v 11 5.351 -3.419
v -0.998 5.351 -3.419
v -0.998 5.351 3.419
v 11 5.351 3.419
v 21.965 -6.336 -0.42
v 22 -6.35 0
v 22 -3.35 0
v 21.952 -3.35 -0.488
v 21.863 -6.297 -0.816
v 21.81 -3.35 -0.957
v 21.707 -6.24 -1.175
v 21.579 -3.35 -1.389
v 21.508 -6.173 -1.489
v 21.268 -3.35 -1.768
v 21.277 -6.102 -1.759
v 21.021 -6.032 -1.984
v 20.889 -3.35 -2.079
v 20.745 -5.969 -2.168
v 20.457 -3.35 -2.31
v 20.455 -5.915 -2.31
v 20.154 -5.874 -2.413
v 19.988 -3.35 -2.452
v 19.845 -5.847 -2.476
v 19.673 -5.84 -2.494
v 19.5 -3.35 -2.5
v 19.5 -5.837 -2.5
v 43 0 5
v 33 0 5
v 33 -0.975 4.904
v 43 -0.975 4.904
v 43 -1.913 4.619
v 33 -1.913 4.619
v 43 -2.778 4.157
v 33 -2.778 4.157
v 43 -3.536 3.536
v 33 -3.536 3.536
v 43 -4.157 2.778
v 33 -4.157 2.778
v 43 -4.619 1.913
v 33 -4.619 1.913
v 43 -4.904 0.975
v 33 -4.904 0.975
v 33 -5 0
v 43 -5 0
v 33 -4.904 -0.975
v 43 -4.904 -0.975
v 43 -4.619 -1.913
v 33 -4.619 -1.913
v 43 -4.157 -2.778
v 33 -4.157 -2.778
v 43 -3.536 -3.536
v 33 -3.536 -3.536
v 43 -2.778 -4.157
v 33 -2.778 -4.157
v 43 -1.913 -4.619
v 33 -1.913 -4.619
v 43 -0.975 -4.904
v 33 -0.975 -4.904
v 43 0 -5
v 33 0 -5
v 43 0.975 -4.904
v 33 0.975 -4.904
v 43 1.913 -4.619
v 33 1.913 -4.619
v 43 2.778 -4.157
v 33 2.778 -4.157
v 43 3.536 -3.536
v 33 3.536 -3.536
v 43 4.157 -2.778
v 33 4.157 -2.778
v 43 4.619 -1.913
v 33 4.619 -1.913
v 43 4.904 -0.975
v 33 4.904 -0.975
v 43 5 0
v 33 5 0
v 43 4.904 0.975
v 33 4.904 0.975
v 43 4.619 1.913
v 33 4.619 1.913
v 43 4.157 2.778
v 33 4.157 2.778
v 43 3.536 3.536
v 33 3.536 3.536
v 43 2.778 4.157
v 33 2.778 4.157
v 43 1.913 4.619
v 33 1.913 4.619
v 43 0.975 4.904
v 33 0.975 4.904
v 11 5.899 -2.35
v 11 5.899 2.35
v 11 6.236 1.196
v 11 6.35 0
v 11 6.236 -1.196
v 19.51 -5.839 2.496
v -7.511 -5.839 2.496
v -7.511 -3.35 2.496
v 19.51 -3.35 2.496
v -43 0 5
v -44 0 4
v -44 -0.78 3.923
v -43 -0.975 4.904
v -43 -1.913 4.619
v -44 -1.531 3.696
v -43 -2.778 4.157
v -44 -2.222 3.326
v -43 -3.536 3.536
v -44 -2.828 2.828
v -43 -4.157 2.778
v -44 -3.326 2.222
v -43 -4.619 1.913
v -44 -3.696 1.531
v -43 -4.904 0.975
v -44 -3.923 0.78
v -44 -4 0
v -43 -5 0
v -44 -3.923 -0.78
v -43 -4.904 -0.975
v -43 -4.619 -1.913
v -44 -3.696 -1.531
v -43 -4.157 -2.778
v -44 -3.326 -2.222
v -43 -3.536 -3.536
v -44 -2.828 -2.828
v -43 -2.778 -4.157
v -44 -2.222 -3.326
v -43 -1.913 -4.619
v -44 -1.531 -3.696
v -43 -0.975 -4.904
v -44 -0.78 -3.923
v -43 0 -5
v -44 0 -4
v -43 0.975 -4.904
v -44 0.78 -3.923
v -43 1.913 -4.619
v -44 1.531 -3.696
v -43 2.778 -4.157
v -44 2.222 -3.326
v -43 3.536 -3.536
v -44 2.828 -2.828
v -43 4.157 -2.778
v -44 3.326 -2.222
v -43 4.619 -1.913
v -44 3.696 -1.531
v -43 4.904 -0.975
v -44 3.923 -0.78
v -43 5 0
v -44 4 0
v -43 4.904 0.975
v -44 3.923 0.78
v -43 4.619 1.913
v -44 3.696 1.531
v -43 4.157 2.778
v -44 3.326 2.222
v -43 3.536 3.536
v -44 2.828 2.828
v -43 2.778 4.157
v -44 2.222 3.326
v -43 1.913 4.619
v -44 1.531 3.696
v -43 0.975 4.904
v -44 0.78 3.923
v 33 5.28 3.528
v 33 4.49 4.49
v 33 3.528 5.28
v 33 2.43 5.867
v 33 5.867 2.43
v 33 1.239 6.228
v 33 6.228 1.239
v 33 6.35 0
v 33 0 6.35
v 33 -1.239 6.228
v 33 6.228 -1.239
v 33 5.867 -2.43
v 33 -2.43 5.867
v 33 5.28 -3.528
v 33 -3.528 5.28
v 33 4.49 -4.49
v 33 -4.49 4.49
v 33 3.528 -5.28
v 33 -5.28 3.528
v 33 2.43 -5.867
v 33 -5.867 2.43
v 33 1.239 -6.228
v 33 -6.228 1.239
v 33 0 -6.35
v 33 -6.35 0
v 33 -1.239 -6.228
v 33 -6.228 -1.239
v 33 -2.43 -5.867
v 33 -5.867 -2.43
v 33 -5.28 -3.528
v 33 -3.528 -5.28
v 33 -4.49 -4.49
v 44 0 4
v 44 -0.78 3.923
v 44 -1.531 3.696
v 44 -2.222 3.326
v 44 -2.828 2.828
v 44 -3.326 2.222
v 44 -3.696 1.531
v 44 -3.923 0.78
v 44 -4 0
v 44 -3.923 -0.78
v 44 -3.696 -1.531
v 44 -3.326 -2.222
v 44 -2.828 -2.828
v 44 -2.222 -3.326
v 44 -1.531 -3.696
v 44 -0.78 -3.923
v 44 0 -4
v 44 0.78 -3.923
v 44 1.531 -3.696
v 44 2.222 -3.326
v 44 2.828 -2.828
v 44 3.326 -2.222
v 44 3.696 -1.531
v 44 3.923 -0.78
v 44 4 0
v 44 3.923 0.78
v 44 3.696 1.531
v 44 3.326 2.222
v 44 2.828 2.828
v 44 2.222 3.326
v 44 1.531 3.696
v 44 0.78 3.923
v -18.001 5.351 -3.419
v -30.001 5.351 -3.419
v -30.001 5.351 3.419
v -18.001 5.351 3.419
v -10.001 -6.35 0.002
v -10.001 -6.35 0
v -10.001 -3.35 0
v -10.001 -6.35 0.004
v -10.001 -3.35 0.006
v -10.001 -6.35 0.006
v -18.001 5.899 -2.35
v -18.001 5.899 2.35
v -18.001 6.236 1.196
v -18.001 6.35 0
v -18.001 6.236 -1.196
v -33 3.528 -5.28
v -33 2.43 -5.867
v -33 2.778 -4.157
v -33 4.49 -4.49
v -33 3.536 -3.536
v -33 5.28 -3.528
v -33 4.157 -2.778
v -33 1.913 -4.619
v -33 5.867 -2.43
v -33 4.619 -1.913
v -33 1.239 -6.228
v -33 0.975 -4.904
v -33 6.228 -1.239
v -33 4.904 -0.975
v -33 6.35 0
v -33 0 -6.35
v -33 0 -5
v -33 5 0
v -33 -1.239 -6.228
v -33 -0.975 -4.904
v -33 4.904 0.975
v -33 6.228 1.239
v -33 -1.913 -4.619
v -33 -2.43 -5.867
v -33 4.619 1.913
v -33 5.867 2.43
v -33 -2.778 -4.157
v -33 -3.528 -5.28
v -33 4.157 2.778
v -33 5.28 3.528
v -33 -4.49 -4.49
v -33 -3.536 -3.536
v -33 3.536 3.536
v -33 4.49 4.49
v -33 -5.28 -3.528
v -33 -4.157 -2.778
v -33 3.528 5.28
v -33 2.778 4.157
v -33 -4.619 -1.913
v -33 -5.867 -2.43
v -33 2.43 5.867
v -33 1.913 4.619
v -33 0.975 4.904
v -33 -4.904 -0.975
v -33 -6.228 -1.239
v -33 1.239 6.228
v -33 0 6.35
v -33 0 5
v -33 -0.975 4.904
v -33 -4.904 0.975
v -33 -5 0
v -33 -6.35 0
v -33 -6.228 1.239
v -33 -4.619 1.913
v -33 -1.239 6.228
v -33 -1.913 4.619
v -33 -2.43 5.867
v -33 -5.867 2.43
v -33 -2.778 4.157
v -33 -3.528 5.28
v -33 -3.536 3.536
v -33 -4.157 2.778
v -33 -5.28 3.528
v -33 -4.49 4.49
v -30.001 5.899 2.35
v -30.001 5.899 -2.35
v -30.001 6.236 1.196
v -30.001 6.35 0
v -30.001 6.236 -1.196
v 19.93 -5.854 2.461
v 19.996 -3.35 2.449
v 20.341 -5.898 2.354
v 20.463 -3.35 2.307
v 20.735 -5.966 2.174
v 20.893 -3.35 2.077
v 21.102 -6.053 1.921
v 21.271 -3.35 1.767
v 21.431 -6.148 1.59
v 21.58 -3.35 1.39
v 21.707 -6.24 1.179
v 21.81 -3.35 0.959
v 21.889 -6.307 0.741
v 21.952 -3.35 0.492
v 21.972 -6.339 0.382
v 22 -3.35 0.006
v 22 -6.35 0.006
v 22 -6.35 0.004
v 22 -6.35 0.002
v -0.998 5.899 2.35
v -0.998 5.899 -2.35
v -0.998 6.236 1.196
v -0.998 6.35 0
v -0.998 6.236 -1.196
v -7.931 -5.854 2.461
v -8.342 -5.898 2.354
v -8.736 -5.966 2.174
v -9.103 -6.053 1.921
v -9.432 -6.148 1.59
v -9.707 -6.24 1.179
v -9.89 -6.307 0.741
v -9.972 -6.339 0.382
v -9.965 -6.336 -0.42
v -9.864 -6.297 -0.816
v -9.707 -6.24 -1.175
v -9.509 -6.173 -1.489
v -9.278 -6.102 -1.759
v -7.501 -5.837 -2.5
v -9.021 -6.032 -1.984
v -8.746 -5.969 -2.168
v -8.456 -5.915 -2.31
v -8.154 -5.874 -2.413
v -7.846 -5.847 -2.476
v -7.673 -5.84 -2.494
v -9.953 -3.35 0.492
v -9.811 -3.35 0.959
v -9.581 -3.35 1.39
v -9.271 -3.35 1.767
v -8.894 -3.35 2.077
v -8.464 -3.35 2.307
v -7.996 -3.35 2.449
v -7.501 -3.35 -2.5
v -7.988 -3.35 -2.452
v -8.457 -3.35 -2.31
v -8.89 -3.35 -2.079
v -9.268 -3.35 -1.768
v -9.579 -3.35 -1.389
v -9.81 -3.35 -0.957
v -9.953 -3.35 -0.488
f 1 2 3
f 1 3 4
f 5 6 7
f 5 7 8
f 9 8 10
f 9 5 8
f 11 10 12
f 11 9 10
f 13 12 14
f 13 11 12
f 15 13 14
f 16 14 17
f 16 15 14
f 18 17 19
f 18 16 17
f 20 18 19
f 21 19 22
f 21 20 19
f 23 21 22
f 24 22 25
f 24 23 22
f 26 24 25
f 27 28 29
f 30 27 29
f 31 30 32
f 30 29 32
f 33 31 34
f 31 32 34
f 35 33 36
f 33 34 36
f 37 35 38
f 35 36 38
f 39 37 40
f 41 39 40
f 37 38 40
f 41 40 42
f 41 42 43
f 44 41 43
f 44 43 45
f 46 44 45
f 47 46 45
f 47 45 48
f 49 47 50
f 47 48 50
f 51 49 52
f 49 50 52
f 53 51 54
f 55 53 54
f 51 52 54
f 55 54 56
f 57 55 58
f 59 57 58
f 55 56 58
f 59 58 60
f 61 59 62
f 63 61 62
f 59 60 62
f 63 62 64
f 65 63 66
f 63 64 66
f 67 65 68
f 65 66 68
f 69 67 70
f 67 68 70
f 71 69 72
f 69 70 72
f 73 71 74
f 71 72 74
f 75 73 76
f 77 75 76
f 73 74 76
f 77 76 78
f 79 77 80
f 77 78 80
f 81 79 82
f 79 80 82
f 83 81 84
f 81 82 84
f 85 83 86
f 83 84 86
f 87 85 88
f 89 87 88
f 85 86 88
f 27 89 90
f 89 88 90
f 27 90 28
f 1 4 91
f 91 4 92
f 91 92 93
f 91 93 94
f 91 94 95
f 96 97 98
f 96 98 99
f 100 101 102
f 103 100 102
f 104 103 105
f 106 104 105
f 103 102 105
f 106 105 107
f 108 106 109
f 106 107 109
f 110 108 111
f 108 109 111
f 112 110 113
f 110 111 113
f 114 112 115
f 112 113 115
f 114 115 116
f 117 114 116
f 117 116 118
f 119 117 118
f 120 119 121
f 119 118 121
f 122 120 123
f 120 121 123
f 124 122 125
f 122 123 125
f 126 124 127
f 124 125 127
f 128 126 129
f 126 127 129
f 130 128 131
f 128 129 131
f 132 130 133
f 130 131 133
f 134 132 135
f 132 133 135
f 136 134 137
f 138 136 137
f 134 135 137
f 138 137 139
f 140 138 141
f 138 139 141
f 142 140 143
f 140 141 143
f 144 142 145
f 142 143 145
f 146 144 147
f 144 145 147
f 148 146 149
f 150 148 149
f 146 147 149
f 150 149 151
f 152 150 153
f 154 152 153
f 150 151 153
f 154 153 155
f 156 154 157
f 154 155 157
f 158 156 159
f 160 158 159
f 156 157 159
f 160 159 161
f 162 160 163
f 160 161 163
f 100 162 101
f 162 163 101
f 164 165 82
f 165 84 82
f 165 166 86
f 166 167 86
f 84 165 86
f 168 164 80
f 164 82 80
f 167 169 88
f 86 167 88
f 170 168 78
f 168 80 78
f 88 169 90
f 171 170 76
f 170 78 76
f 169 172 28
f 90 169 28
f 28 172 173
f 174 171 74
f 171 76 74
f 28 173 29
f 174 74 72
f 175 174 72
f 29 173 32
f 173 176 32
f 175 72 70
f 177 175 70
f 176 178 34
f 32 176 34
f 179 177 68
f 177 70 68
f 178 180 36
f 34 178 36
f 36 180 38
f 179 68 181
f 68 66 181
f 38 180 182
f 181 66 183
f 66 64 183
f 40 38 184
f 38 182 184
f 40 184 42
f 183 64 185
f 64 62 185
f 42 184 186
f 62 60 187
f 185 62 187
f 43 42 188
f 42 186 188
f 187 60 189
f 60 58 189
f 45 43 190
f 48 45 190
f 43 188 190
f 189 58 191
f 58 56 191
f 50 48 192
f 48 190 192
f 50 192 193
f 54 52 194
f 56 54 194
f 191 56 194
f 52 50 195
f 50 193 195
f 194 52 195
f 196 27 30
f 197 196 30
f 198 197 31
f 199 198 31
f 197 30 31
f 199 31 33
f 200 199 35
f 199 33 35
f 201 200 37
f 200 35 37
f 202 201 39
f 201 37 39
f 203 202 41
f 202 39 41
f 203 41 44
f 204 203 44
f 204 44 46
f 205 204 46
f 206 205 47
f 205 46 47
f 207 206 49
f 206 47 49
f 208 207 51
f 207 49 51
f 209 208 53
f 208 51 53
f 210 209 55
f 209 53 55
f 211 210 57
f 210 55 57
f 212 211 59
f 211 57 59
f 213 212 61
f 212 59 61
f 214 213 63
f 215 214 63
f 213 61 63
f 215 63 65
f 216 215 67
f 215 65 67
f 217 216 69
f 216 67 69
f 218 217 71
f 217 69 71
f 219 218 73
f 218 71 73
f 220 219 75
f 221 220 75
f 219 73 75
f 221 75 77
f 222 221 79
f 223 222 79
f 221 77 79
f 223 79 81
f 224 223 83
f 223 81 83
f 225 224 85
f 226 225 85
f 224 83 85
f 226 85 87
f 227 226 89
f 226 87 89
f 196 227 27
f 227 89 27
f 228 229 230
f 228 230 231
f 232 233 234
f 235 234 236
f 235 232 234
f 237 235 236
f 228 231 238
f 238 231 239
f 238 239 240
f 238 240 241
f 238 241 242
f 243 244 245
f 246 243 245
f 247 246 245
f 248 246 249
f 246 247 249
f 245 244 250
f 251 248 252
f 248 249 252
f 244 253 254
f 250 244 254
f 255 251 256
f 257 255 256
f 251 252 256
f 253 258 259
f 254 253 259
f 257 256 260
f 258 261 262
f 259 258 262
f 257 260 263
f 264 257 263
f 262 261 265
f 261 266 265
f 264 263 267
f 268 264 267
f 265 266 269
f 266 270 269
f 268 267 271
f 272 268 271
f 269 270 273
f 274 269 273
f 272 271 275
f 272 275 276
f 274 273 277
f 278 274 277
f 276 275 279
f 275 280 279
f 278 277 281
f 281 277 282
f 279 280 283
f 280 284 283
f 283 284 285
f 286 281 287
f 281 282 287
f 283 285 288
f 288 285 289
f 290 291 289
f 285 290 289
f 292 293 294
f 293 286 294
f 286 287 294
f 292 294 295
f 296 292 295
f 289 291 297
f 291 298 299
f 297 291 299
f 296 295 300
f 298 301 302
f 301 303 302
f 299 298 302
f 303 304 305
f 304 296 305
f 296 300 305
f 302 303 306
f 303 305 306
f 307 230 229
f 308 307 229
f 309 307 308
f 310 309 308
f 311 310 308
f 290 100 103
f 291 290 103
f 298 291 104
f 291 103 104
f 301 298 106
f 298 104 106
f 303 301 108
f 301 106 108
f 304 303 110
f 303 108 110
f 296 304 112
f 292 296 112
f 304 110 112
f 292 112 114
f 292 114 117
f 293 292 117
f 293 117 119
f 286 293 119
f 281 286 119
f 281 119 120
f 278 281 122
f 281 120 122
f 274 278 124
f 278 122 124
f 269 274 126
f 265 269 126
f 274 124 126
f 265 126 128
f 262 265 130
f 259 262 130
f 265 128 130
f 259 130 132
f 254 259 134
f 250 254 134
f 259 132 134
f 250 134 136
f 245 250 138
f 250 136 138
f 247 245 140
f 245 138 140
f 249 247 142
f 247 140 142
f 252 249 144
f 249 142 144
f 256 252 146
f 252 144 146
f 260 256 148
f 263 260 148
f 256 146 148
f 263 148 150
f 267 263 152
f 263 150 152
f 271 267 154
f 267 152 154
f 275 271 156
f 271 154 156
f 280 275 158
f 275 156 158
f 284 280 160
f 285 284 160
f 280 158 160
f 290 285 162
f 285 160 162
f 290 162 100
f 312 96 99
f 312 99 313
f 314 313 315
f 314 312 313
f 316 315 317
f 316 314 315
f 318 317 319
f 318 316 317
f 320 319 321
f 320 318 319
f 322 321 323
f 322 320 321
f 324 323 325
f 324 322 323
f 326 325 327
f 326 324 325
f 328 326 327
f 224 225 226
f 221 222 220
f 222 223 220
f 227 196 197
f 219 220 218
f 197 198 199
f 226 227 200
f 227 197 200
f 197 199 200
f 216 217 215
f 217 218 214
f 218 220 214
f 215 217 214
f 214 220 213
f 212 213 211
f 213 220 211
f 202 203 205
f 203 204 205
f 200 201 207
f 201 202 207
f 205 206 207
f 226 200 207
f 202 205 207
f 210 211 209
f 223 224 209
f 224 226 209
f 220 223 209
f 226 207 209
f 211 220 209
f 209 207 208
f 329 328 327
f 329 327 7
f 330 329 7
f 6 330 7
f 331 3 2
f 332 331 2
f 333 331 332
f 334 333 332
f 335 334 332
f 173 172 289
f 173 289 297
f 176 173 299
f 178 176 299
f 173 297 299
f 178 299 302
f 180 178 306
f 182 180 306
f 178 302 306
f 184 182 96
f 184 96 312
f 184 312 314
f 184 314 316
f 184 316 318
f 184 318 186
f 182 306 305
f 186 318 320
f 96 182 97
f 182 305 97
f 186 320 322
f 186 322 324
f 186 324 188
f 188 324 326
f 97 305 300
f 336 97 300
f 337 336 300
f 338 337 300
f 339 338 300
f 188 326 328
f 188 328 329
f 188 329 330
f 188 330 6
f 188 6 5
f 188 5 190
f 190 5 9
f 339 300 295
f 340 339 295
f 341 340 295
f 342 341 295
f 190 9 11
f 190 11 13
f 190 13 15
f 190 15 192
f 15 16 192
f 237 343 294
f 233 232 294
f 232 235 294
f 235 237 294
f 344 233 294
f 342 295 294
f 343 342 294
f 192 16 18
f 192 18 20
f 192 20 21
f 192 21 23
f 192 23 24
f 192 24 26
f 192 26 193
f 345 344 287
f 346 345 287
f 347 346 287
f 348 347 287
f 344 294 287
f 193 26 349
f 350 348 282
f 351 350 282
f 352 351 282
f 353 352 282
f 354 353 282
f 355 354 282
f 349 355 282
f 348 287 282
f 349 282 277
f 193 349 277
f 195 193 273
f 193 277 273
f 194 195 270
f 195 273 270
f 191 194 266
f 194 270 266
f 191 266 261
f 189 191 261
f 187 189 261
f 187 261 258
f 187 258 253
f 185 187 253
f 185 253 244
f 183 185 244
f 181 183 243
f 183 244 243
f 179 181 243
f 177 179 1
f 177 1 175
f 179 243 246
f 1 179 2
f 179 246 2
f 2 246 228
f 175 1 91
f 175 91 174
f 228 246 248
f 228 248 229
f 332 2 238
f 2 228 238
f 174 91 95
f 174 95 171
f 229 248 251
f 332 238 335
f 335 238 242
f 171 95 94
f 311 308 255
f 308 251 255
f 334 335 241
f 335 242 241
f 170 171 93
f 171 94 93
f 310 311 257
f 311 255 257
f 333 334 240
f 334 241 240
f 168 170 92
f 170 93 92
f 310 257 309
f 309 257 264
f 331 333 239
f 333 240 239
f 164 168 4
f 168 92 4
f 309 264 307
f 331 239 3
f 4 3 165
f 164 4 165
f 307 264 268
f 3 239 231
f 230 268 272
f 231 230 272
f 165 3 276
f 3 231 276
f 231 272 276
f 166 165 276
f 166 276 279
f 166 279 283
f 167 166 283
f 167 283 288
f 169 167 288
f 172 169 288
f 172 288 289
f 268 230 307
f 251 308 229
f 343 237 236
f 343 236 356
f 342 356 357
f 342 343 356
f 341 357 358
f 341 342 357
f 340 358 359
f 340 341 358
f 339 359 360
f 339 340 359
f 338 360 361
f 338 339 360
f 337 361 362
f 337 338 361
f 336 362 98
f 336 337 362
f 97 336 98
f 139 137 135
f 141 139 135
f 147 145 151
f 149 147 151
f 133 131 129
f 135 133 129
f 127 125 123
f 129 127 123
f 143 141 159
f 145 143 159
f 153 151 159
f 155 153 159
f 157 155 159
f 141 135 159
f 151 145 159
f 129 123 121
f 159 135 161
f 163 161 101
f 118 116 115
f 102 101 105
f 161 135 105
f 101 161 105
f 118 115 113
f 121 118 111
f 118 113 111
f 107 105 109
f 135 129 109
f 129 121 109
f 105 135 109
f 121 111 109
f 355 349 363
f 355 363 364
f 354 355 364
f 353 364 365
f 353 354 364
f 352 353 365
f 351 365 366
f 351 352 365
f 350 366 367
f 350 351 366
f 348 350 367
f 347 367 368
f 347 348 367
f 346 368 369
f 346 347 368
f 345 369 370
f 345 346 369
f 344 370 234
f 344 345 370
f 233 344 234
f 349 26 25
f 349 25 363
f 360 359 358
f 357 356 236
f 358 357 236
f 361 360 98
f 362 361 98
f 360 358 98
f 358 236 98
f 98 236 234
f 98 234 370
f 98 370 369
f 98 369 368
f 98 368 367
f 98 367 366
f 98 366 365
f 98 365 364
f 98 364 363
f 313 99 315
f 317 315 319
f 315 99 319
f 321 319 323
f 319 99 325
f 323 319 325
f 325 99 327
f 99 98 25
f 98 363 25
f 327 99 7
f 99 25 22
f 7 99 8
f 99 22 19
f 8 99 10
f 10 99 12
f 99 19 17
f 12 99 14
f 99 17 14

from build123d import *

# Parameters (mm, degrees)
CHAMFER1_SIZE           = 1
CUT_EXTRUDE1_DEPTH      = 45.907070713
CUT_EXTRUDE1_DEPTH_BACK = 45.907070713
SKETCH3_W               = 11.997849067
SKETCH3_H               = 0.999274346
SKETCH3_W_2             = 11.999787666
CUT_EXTRUDE2_DEPTH      = 3


with BuildPart() as part:
    # Sketch2 → Revolve1 (revolve)
    with BuildSketch(Plane.XY, mode=Mode.PRIVATE) as revolve1_sk:
        Polygon((33, 6.35), (-33, 6.35), (-33, 5), (-44, 5), (-44, 0), (44, 0), (44, 5), (33, 5), align=None)
    revolve(revolve1_sk.sketch.rotate(Axis((-44, 0, 0), (1, 0, 0)), 90), axis=Axis((-44, 0, 0), (1, 0, 0)))

    # Chamfer1
    chamfer1_edges = [part.edges().sort_by_distance(p)[0] for p in [
        (44, 0, -5),
        (-44, 0, -5),
    ]]
    chamfer(chamfer1_edges, length=CHAMFER1_SIZE)

    # Sketch3 → Cut-Extrude1 (cut, two sides: drawn at the far end of the back side and taken through both)
    with BuildSketch(Plane.XY.offset(-CUT_EXTRUDE1_DEPTH_BACK)):
        with Locations((5.001075466, 5.850362827)):
            Rectangle(SKETCH3_W, SKETCH3_H)
        with Locations((-24.000665712, 5.850362827)):
            Rectangle(SKETCH3_W_2, SKETCH3_H)
    extrude(amount=CUT_EXTRUDE1_DEPTH + CUT_EXTRUDE1_DEPTH_BACK, mode=Mode.SUBTRACT)

    # Sketch6 → Cut-Extrude2 (cut)
    with BuildSketch(Plane(origin=(0, -6.35, 0), x_dir=(1, 0, 0), z_dir=(0, 1, 0))):
        with BuildLine():
            Line((19.5, 2.5), (-7.500665679, 2.5))
            ThreePointArc((-7.500665679, 2.5), (-9.268432632, 1.767766953), (-10.000665679, 0))
            Line((-10.000665679, 0), (-10.000665679, -0.006446088))
            ThreePointArc((-10.000665679, -0.006446088), (-9.271361564, -1.767141973), (-7.510665679, -2.496446088))
            Line((-7.510665679, -2.496446088), (19.51, -2.496446088))
            ThreePointArc((19.51, -2.496446088), (21.270695885, -1.767141973), (22, -0.006446088))
            Line((22, -0.006446088), (22, 0))
            ThreePointArc((22, 0), (21.267766953, 1.767766953), (19.5, 2.5))
        make_face()
    extrude(amount=CUT_EXTRUDE2_DEPTH, mode=Mode.SUBTRACT)


solid = part.part
